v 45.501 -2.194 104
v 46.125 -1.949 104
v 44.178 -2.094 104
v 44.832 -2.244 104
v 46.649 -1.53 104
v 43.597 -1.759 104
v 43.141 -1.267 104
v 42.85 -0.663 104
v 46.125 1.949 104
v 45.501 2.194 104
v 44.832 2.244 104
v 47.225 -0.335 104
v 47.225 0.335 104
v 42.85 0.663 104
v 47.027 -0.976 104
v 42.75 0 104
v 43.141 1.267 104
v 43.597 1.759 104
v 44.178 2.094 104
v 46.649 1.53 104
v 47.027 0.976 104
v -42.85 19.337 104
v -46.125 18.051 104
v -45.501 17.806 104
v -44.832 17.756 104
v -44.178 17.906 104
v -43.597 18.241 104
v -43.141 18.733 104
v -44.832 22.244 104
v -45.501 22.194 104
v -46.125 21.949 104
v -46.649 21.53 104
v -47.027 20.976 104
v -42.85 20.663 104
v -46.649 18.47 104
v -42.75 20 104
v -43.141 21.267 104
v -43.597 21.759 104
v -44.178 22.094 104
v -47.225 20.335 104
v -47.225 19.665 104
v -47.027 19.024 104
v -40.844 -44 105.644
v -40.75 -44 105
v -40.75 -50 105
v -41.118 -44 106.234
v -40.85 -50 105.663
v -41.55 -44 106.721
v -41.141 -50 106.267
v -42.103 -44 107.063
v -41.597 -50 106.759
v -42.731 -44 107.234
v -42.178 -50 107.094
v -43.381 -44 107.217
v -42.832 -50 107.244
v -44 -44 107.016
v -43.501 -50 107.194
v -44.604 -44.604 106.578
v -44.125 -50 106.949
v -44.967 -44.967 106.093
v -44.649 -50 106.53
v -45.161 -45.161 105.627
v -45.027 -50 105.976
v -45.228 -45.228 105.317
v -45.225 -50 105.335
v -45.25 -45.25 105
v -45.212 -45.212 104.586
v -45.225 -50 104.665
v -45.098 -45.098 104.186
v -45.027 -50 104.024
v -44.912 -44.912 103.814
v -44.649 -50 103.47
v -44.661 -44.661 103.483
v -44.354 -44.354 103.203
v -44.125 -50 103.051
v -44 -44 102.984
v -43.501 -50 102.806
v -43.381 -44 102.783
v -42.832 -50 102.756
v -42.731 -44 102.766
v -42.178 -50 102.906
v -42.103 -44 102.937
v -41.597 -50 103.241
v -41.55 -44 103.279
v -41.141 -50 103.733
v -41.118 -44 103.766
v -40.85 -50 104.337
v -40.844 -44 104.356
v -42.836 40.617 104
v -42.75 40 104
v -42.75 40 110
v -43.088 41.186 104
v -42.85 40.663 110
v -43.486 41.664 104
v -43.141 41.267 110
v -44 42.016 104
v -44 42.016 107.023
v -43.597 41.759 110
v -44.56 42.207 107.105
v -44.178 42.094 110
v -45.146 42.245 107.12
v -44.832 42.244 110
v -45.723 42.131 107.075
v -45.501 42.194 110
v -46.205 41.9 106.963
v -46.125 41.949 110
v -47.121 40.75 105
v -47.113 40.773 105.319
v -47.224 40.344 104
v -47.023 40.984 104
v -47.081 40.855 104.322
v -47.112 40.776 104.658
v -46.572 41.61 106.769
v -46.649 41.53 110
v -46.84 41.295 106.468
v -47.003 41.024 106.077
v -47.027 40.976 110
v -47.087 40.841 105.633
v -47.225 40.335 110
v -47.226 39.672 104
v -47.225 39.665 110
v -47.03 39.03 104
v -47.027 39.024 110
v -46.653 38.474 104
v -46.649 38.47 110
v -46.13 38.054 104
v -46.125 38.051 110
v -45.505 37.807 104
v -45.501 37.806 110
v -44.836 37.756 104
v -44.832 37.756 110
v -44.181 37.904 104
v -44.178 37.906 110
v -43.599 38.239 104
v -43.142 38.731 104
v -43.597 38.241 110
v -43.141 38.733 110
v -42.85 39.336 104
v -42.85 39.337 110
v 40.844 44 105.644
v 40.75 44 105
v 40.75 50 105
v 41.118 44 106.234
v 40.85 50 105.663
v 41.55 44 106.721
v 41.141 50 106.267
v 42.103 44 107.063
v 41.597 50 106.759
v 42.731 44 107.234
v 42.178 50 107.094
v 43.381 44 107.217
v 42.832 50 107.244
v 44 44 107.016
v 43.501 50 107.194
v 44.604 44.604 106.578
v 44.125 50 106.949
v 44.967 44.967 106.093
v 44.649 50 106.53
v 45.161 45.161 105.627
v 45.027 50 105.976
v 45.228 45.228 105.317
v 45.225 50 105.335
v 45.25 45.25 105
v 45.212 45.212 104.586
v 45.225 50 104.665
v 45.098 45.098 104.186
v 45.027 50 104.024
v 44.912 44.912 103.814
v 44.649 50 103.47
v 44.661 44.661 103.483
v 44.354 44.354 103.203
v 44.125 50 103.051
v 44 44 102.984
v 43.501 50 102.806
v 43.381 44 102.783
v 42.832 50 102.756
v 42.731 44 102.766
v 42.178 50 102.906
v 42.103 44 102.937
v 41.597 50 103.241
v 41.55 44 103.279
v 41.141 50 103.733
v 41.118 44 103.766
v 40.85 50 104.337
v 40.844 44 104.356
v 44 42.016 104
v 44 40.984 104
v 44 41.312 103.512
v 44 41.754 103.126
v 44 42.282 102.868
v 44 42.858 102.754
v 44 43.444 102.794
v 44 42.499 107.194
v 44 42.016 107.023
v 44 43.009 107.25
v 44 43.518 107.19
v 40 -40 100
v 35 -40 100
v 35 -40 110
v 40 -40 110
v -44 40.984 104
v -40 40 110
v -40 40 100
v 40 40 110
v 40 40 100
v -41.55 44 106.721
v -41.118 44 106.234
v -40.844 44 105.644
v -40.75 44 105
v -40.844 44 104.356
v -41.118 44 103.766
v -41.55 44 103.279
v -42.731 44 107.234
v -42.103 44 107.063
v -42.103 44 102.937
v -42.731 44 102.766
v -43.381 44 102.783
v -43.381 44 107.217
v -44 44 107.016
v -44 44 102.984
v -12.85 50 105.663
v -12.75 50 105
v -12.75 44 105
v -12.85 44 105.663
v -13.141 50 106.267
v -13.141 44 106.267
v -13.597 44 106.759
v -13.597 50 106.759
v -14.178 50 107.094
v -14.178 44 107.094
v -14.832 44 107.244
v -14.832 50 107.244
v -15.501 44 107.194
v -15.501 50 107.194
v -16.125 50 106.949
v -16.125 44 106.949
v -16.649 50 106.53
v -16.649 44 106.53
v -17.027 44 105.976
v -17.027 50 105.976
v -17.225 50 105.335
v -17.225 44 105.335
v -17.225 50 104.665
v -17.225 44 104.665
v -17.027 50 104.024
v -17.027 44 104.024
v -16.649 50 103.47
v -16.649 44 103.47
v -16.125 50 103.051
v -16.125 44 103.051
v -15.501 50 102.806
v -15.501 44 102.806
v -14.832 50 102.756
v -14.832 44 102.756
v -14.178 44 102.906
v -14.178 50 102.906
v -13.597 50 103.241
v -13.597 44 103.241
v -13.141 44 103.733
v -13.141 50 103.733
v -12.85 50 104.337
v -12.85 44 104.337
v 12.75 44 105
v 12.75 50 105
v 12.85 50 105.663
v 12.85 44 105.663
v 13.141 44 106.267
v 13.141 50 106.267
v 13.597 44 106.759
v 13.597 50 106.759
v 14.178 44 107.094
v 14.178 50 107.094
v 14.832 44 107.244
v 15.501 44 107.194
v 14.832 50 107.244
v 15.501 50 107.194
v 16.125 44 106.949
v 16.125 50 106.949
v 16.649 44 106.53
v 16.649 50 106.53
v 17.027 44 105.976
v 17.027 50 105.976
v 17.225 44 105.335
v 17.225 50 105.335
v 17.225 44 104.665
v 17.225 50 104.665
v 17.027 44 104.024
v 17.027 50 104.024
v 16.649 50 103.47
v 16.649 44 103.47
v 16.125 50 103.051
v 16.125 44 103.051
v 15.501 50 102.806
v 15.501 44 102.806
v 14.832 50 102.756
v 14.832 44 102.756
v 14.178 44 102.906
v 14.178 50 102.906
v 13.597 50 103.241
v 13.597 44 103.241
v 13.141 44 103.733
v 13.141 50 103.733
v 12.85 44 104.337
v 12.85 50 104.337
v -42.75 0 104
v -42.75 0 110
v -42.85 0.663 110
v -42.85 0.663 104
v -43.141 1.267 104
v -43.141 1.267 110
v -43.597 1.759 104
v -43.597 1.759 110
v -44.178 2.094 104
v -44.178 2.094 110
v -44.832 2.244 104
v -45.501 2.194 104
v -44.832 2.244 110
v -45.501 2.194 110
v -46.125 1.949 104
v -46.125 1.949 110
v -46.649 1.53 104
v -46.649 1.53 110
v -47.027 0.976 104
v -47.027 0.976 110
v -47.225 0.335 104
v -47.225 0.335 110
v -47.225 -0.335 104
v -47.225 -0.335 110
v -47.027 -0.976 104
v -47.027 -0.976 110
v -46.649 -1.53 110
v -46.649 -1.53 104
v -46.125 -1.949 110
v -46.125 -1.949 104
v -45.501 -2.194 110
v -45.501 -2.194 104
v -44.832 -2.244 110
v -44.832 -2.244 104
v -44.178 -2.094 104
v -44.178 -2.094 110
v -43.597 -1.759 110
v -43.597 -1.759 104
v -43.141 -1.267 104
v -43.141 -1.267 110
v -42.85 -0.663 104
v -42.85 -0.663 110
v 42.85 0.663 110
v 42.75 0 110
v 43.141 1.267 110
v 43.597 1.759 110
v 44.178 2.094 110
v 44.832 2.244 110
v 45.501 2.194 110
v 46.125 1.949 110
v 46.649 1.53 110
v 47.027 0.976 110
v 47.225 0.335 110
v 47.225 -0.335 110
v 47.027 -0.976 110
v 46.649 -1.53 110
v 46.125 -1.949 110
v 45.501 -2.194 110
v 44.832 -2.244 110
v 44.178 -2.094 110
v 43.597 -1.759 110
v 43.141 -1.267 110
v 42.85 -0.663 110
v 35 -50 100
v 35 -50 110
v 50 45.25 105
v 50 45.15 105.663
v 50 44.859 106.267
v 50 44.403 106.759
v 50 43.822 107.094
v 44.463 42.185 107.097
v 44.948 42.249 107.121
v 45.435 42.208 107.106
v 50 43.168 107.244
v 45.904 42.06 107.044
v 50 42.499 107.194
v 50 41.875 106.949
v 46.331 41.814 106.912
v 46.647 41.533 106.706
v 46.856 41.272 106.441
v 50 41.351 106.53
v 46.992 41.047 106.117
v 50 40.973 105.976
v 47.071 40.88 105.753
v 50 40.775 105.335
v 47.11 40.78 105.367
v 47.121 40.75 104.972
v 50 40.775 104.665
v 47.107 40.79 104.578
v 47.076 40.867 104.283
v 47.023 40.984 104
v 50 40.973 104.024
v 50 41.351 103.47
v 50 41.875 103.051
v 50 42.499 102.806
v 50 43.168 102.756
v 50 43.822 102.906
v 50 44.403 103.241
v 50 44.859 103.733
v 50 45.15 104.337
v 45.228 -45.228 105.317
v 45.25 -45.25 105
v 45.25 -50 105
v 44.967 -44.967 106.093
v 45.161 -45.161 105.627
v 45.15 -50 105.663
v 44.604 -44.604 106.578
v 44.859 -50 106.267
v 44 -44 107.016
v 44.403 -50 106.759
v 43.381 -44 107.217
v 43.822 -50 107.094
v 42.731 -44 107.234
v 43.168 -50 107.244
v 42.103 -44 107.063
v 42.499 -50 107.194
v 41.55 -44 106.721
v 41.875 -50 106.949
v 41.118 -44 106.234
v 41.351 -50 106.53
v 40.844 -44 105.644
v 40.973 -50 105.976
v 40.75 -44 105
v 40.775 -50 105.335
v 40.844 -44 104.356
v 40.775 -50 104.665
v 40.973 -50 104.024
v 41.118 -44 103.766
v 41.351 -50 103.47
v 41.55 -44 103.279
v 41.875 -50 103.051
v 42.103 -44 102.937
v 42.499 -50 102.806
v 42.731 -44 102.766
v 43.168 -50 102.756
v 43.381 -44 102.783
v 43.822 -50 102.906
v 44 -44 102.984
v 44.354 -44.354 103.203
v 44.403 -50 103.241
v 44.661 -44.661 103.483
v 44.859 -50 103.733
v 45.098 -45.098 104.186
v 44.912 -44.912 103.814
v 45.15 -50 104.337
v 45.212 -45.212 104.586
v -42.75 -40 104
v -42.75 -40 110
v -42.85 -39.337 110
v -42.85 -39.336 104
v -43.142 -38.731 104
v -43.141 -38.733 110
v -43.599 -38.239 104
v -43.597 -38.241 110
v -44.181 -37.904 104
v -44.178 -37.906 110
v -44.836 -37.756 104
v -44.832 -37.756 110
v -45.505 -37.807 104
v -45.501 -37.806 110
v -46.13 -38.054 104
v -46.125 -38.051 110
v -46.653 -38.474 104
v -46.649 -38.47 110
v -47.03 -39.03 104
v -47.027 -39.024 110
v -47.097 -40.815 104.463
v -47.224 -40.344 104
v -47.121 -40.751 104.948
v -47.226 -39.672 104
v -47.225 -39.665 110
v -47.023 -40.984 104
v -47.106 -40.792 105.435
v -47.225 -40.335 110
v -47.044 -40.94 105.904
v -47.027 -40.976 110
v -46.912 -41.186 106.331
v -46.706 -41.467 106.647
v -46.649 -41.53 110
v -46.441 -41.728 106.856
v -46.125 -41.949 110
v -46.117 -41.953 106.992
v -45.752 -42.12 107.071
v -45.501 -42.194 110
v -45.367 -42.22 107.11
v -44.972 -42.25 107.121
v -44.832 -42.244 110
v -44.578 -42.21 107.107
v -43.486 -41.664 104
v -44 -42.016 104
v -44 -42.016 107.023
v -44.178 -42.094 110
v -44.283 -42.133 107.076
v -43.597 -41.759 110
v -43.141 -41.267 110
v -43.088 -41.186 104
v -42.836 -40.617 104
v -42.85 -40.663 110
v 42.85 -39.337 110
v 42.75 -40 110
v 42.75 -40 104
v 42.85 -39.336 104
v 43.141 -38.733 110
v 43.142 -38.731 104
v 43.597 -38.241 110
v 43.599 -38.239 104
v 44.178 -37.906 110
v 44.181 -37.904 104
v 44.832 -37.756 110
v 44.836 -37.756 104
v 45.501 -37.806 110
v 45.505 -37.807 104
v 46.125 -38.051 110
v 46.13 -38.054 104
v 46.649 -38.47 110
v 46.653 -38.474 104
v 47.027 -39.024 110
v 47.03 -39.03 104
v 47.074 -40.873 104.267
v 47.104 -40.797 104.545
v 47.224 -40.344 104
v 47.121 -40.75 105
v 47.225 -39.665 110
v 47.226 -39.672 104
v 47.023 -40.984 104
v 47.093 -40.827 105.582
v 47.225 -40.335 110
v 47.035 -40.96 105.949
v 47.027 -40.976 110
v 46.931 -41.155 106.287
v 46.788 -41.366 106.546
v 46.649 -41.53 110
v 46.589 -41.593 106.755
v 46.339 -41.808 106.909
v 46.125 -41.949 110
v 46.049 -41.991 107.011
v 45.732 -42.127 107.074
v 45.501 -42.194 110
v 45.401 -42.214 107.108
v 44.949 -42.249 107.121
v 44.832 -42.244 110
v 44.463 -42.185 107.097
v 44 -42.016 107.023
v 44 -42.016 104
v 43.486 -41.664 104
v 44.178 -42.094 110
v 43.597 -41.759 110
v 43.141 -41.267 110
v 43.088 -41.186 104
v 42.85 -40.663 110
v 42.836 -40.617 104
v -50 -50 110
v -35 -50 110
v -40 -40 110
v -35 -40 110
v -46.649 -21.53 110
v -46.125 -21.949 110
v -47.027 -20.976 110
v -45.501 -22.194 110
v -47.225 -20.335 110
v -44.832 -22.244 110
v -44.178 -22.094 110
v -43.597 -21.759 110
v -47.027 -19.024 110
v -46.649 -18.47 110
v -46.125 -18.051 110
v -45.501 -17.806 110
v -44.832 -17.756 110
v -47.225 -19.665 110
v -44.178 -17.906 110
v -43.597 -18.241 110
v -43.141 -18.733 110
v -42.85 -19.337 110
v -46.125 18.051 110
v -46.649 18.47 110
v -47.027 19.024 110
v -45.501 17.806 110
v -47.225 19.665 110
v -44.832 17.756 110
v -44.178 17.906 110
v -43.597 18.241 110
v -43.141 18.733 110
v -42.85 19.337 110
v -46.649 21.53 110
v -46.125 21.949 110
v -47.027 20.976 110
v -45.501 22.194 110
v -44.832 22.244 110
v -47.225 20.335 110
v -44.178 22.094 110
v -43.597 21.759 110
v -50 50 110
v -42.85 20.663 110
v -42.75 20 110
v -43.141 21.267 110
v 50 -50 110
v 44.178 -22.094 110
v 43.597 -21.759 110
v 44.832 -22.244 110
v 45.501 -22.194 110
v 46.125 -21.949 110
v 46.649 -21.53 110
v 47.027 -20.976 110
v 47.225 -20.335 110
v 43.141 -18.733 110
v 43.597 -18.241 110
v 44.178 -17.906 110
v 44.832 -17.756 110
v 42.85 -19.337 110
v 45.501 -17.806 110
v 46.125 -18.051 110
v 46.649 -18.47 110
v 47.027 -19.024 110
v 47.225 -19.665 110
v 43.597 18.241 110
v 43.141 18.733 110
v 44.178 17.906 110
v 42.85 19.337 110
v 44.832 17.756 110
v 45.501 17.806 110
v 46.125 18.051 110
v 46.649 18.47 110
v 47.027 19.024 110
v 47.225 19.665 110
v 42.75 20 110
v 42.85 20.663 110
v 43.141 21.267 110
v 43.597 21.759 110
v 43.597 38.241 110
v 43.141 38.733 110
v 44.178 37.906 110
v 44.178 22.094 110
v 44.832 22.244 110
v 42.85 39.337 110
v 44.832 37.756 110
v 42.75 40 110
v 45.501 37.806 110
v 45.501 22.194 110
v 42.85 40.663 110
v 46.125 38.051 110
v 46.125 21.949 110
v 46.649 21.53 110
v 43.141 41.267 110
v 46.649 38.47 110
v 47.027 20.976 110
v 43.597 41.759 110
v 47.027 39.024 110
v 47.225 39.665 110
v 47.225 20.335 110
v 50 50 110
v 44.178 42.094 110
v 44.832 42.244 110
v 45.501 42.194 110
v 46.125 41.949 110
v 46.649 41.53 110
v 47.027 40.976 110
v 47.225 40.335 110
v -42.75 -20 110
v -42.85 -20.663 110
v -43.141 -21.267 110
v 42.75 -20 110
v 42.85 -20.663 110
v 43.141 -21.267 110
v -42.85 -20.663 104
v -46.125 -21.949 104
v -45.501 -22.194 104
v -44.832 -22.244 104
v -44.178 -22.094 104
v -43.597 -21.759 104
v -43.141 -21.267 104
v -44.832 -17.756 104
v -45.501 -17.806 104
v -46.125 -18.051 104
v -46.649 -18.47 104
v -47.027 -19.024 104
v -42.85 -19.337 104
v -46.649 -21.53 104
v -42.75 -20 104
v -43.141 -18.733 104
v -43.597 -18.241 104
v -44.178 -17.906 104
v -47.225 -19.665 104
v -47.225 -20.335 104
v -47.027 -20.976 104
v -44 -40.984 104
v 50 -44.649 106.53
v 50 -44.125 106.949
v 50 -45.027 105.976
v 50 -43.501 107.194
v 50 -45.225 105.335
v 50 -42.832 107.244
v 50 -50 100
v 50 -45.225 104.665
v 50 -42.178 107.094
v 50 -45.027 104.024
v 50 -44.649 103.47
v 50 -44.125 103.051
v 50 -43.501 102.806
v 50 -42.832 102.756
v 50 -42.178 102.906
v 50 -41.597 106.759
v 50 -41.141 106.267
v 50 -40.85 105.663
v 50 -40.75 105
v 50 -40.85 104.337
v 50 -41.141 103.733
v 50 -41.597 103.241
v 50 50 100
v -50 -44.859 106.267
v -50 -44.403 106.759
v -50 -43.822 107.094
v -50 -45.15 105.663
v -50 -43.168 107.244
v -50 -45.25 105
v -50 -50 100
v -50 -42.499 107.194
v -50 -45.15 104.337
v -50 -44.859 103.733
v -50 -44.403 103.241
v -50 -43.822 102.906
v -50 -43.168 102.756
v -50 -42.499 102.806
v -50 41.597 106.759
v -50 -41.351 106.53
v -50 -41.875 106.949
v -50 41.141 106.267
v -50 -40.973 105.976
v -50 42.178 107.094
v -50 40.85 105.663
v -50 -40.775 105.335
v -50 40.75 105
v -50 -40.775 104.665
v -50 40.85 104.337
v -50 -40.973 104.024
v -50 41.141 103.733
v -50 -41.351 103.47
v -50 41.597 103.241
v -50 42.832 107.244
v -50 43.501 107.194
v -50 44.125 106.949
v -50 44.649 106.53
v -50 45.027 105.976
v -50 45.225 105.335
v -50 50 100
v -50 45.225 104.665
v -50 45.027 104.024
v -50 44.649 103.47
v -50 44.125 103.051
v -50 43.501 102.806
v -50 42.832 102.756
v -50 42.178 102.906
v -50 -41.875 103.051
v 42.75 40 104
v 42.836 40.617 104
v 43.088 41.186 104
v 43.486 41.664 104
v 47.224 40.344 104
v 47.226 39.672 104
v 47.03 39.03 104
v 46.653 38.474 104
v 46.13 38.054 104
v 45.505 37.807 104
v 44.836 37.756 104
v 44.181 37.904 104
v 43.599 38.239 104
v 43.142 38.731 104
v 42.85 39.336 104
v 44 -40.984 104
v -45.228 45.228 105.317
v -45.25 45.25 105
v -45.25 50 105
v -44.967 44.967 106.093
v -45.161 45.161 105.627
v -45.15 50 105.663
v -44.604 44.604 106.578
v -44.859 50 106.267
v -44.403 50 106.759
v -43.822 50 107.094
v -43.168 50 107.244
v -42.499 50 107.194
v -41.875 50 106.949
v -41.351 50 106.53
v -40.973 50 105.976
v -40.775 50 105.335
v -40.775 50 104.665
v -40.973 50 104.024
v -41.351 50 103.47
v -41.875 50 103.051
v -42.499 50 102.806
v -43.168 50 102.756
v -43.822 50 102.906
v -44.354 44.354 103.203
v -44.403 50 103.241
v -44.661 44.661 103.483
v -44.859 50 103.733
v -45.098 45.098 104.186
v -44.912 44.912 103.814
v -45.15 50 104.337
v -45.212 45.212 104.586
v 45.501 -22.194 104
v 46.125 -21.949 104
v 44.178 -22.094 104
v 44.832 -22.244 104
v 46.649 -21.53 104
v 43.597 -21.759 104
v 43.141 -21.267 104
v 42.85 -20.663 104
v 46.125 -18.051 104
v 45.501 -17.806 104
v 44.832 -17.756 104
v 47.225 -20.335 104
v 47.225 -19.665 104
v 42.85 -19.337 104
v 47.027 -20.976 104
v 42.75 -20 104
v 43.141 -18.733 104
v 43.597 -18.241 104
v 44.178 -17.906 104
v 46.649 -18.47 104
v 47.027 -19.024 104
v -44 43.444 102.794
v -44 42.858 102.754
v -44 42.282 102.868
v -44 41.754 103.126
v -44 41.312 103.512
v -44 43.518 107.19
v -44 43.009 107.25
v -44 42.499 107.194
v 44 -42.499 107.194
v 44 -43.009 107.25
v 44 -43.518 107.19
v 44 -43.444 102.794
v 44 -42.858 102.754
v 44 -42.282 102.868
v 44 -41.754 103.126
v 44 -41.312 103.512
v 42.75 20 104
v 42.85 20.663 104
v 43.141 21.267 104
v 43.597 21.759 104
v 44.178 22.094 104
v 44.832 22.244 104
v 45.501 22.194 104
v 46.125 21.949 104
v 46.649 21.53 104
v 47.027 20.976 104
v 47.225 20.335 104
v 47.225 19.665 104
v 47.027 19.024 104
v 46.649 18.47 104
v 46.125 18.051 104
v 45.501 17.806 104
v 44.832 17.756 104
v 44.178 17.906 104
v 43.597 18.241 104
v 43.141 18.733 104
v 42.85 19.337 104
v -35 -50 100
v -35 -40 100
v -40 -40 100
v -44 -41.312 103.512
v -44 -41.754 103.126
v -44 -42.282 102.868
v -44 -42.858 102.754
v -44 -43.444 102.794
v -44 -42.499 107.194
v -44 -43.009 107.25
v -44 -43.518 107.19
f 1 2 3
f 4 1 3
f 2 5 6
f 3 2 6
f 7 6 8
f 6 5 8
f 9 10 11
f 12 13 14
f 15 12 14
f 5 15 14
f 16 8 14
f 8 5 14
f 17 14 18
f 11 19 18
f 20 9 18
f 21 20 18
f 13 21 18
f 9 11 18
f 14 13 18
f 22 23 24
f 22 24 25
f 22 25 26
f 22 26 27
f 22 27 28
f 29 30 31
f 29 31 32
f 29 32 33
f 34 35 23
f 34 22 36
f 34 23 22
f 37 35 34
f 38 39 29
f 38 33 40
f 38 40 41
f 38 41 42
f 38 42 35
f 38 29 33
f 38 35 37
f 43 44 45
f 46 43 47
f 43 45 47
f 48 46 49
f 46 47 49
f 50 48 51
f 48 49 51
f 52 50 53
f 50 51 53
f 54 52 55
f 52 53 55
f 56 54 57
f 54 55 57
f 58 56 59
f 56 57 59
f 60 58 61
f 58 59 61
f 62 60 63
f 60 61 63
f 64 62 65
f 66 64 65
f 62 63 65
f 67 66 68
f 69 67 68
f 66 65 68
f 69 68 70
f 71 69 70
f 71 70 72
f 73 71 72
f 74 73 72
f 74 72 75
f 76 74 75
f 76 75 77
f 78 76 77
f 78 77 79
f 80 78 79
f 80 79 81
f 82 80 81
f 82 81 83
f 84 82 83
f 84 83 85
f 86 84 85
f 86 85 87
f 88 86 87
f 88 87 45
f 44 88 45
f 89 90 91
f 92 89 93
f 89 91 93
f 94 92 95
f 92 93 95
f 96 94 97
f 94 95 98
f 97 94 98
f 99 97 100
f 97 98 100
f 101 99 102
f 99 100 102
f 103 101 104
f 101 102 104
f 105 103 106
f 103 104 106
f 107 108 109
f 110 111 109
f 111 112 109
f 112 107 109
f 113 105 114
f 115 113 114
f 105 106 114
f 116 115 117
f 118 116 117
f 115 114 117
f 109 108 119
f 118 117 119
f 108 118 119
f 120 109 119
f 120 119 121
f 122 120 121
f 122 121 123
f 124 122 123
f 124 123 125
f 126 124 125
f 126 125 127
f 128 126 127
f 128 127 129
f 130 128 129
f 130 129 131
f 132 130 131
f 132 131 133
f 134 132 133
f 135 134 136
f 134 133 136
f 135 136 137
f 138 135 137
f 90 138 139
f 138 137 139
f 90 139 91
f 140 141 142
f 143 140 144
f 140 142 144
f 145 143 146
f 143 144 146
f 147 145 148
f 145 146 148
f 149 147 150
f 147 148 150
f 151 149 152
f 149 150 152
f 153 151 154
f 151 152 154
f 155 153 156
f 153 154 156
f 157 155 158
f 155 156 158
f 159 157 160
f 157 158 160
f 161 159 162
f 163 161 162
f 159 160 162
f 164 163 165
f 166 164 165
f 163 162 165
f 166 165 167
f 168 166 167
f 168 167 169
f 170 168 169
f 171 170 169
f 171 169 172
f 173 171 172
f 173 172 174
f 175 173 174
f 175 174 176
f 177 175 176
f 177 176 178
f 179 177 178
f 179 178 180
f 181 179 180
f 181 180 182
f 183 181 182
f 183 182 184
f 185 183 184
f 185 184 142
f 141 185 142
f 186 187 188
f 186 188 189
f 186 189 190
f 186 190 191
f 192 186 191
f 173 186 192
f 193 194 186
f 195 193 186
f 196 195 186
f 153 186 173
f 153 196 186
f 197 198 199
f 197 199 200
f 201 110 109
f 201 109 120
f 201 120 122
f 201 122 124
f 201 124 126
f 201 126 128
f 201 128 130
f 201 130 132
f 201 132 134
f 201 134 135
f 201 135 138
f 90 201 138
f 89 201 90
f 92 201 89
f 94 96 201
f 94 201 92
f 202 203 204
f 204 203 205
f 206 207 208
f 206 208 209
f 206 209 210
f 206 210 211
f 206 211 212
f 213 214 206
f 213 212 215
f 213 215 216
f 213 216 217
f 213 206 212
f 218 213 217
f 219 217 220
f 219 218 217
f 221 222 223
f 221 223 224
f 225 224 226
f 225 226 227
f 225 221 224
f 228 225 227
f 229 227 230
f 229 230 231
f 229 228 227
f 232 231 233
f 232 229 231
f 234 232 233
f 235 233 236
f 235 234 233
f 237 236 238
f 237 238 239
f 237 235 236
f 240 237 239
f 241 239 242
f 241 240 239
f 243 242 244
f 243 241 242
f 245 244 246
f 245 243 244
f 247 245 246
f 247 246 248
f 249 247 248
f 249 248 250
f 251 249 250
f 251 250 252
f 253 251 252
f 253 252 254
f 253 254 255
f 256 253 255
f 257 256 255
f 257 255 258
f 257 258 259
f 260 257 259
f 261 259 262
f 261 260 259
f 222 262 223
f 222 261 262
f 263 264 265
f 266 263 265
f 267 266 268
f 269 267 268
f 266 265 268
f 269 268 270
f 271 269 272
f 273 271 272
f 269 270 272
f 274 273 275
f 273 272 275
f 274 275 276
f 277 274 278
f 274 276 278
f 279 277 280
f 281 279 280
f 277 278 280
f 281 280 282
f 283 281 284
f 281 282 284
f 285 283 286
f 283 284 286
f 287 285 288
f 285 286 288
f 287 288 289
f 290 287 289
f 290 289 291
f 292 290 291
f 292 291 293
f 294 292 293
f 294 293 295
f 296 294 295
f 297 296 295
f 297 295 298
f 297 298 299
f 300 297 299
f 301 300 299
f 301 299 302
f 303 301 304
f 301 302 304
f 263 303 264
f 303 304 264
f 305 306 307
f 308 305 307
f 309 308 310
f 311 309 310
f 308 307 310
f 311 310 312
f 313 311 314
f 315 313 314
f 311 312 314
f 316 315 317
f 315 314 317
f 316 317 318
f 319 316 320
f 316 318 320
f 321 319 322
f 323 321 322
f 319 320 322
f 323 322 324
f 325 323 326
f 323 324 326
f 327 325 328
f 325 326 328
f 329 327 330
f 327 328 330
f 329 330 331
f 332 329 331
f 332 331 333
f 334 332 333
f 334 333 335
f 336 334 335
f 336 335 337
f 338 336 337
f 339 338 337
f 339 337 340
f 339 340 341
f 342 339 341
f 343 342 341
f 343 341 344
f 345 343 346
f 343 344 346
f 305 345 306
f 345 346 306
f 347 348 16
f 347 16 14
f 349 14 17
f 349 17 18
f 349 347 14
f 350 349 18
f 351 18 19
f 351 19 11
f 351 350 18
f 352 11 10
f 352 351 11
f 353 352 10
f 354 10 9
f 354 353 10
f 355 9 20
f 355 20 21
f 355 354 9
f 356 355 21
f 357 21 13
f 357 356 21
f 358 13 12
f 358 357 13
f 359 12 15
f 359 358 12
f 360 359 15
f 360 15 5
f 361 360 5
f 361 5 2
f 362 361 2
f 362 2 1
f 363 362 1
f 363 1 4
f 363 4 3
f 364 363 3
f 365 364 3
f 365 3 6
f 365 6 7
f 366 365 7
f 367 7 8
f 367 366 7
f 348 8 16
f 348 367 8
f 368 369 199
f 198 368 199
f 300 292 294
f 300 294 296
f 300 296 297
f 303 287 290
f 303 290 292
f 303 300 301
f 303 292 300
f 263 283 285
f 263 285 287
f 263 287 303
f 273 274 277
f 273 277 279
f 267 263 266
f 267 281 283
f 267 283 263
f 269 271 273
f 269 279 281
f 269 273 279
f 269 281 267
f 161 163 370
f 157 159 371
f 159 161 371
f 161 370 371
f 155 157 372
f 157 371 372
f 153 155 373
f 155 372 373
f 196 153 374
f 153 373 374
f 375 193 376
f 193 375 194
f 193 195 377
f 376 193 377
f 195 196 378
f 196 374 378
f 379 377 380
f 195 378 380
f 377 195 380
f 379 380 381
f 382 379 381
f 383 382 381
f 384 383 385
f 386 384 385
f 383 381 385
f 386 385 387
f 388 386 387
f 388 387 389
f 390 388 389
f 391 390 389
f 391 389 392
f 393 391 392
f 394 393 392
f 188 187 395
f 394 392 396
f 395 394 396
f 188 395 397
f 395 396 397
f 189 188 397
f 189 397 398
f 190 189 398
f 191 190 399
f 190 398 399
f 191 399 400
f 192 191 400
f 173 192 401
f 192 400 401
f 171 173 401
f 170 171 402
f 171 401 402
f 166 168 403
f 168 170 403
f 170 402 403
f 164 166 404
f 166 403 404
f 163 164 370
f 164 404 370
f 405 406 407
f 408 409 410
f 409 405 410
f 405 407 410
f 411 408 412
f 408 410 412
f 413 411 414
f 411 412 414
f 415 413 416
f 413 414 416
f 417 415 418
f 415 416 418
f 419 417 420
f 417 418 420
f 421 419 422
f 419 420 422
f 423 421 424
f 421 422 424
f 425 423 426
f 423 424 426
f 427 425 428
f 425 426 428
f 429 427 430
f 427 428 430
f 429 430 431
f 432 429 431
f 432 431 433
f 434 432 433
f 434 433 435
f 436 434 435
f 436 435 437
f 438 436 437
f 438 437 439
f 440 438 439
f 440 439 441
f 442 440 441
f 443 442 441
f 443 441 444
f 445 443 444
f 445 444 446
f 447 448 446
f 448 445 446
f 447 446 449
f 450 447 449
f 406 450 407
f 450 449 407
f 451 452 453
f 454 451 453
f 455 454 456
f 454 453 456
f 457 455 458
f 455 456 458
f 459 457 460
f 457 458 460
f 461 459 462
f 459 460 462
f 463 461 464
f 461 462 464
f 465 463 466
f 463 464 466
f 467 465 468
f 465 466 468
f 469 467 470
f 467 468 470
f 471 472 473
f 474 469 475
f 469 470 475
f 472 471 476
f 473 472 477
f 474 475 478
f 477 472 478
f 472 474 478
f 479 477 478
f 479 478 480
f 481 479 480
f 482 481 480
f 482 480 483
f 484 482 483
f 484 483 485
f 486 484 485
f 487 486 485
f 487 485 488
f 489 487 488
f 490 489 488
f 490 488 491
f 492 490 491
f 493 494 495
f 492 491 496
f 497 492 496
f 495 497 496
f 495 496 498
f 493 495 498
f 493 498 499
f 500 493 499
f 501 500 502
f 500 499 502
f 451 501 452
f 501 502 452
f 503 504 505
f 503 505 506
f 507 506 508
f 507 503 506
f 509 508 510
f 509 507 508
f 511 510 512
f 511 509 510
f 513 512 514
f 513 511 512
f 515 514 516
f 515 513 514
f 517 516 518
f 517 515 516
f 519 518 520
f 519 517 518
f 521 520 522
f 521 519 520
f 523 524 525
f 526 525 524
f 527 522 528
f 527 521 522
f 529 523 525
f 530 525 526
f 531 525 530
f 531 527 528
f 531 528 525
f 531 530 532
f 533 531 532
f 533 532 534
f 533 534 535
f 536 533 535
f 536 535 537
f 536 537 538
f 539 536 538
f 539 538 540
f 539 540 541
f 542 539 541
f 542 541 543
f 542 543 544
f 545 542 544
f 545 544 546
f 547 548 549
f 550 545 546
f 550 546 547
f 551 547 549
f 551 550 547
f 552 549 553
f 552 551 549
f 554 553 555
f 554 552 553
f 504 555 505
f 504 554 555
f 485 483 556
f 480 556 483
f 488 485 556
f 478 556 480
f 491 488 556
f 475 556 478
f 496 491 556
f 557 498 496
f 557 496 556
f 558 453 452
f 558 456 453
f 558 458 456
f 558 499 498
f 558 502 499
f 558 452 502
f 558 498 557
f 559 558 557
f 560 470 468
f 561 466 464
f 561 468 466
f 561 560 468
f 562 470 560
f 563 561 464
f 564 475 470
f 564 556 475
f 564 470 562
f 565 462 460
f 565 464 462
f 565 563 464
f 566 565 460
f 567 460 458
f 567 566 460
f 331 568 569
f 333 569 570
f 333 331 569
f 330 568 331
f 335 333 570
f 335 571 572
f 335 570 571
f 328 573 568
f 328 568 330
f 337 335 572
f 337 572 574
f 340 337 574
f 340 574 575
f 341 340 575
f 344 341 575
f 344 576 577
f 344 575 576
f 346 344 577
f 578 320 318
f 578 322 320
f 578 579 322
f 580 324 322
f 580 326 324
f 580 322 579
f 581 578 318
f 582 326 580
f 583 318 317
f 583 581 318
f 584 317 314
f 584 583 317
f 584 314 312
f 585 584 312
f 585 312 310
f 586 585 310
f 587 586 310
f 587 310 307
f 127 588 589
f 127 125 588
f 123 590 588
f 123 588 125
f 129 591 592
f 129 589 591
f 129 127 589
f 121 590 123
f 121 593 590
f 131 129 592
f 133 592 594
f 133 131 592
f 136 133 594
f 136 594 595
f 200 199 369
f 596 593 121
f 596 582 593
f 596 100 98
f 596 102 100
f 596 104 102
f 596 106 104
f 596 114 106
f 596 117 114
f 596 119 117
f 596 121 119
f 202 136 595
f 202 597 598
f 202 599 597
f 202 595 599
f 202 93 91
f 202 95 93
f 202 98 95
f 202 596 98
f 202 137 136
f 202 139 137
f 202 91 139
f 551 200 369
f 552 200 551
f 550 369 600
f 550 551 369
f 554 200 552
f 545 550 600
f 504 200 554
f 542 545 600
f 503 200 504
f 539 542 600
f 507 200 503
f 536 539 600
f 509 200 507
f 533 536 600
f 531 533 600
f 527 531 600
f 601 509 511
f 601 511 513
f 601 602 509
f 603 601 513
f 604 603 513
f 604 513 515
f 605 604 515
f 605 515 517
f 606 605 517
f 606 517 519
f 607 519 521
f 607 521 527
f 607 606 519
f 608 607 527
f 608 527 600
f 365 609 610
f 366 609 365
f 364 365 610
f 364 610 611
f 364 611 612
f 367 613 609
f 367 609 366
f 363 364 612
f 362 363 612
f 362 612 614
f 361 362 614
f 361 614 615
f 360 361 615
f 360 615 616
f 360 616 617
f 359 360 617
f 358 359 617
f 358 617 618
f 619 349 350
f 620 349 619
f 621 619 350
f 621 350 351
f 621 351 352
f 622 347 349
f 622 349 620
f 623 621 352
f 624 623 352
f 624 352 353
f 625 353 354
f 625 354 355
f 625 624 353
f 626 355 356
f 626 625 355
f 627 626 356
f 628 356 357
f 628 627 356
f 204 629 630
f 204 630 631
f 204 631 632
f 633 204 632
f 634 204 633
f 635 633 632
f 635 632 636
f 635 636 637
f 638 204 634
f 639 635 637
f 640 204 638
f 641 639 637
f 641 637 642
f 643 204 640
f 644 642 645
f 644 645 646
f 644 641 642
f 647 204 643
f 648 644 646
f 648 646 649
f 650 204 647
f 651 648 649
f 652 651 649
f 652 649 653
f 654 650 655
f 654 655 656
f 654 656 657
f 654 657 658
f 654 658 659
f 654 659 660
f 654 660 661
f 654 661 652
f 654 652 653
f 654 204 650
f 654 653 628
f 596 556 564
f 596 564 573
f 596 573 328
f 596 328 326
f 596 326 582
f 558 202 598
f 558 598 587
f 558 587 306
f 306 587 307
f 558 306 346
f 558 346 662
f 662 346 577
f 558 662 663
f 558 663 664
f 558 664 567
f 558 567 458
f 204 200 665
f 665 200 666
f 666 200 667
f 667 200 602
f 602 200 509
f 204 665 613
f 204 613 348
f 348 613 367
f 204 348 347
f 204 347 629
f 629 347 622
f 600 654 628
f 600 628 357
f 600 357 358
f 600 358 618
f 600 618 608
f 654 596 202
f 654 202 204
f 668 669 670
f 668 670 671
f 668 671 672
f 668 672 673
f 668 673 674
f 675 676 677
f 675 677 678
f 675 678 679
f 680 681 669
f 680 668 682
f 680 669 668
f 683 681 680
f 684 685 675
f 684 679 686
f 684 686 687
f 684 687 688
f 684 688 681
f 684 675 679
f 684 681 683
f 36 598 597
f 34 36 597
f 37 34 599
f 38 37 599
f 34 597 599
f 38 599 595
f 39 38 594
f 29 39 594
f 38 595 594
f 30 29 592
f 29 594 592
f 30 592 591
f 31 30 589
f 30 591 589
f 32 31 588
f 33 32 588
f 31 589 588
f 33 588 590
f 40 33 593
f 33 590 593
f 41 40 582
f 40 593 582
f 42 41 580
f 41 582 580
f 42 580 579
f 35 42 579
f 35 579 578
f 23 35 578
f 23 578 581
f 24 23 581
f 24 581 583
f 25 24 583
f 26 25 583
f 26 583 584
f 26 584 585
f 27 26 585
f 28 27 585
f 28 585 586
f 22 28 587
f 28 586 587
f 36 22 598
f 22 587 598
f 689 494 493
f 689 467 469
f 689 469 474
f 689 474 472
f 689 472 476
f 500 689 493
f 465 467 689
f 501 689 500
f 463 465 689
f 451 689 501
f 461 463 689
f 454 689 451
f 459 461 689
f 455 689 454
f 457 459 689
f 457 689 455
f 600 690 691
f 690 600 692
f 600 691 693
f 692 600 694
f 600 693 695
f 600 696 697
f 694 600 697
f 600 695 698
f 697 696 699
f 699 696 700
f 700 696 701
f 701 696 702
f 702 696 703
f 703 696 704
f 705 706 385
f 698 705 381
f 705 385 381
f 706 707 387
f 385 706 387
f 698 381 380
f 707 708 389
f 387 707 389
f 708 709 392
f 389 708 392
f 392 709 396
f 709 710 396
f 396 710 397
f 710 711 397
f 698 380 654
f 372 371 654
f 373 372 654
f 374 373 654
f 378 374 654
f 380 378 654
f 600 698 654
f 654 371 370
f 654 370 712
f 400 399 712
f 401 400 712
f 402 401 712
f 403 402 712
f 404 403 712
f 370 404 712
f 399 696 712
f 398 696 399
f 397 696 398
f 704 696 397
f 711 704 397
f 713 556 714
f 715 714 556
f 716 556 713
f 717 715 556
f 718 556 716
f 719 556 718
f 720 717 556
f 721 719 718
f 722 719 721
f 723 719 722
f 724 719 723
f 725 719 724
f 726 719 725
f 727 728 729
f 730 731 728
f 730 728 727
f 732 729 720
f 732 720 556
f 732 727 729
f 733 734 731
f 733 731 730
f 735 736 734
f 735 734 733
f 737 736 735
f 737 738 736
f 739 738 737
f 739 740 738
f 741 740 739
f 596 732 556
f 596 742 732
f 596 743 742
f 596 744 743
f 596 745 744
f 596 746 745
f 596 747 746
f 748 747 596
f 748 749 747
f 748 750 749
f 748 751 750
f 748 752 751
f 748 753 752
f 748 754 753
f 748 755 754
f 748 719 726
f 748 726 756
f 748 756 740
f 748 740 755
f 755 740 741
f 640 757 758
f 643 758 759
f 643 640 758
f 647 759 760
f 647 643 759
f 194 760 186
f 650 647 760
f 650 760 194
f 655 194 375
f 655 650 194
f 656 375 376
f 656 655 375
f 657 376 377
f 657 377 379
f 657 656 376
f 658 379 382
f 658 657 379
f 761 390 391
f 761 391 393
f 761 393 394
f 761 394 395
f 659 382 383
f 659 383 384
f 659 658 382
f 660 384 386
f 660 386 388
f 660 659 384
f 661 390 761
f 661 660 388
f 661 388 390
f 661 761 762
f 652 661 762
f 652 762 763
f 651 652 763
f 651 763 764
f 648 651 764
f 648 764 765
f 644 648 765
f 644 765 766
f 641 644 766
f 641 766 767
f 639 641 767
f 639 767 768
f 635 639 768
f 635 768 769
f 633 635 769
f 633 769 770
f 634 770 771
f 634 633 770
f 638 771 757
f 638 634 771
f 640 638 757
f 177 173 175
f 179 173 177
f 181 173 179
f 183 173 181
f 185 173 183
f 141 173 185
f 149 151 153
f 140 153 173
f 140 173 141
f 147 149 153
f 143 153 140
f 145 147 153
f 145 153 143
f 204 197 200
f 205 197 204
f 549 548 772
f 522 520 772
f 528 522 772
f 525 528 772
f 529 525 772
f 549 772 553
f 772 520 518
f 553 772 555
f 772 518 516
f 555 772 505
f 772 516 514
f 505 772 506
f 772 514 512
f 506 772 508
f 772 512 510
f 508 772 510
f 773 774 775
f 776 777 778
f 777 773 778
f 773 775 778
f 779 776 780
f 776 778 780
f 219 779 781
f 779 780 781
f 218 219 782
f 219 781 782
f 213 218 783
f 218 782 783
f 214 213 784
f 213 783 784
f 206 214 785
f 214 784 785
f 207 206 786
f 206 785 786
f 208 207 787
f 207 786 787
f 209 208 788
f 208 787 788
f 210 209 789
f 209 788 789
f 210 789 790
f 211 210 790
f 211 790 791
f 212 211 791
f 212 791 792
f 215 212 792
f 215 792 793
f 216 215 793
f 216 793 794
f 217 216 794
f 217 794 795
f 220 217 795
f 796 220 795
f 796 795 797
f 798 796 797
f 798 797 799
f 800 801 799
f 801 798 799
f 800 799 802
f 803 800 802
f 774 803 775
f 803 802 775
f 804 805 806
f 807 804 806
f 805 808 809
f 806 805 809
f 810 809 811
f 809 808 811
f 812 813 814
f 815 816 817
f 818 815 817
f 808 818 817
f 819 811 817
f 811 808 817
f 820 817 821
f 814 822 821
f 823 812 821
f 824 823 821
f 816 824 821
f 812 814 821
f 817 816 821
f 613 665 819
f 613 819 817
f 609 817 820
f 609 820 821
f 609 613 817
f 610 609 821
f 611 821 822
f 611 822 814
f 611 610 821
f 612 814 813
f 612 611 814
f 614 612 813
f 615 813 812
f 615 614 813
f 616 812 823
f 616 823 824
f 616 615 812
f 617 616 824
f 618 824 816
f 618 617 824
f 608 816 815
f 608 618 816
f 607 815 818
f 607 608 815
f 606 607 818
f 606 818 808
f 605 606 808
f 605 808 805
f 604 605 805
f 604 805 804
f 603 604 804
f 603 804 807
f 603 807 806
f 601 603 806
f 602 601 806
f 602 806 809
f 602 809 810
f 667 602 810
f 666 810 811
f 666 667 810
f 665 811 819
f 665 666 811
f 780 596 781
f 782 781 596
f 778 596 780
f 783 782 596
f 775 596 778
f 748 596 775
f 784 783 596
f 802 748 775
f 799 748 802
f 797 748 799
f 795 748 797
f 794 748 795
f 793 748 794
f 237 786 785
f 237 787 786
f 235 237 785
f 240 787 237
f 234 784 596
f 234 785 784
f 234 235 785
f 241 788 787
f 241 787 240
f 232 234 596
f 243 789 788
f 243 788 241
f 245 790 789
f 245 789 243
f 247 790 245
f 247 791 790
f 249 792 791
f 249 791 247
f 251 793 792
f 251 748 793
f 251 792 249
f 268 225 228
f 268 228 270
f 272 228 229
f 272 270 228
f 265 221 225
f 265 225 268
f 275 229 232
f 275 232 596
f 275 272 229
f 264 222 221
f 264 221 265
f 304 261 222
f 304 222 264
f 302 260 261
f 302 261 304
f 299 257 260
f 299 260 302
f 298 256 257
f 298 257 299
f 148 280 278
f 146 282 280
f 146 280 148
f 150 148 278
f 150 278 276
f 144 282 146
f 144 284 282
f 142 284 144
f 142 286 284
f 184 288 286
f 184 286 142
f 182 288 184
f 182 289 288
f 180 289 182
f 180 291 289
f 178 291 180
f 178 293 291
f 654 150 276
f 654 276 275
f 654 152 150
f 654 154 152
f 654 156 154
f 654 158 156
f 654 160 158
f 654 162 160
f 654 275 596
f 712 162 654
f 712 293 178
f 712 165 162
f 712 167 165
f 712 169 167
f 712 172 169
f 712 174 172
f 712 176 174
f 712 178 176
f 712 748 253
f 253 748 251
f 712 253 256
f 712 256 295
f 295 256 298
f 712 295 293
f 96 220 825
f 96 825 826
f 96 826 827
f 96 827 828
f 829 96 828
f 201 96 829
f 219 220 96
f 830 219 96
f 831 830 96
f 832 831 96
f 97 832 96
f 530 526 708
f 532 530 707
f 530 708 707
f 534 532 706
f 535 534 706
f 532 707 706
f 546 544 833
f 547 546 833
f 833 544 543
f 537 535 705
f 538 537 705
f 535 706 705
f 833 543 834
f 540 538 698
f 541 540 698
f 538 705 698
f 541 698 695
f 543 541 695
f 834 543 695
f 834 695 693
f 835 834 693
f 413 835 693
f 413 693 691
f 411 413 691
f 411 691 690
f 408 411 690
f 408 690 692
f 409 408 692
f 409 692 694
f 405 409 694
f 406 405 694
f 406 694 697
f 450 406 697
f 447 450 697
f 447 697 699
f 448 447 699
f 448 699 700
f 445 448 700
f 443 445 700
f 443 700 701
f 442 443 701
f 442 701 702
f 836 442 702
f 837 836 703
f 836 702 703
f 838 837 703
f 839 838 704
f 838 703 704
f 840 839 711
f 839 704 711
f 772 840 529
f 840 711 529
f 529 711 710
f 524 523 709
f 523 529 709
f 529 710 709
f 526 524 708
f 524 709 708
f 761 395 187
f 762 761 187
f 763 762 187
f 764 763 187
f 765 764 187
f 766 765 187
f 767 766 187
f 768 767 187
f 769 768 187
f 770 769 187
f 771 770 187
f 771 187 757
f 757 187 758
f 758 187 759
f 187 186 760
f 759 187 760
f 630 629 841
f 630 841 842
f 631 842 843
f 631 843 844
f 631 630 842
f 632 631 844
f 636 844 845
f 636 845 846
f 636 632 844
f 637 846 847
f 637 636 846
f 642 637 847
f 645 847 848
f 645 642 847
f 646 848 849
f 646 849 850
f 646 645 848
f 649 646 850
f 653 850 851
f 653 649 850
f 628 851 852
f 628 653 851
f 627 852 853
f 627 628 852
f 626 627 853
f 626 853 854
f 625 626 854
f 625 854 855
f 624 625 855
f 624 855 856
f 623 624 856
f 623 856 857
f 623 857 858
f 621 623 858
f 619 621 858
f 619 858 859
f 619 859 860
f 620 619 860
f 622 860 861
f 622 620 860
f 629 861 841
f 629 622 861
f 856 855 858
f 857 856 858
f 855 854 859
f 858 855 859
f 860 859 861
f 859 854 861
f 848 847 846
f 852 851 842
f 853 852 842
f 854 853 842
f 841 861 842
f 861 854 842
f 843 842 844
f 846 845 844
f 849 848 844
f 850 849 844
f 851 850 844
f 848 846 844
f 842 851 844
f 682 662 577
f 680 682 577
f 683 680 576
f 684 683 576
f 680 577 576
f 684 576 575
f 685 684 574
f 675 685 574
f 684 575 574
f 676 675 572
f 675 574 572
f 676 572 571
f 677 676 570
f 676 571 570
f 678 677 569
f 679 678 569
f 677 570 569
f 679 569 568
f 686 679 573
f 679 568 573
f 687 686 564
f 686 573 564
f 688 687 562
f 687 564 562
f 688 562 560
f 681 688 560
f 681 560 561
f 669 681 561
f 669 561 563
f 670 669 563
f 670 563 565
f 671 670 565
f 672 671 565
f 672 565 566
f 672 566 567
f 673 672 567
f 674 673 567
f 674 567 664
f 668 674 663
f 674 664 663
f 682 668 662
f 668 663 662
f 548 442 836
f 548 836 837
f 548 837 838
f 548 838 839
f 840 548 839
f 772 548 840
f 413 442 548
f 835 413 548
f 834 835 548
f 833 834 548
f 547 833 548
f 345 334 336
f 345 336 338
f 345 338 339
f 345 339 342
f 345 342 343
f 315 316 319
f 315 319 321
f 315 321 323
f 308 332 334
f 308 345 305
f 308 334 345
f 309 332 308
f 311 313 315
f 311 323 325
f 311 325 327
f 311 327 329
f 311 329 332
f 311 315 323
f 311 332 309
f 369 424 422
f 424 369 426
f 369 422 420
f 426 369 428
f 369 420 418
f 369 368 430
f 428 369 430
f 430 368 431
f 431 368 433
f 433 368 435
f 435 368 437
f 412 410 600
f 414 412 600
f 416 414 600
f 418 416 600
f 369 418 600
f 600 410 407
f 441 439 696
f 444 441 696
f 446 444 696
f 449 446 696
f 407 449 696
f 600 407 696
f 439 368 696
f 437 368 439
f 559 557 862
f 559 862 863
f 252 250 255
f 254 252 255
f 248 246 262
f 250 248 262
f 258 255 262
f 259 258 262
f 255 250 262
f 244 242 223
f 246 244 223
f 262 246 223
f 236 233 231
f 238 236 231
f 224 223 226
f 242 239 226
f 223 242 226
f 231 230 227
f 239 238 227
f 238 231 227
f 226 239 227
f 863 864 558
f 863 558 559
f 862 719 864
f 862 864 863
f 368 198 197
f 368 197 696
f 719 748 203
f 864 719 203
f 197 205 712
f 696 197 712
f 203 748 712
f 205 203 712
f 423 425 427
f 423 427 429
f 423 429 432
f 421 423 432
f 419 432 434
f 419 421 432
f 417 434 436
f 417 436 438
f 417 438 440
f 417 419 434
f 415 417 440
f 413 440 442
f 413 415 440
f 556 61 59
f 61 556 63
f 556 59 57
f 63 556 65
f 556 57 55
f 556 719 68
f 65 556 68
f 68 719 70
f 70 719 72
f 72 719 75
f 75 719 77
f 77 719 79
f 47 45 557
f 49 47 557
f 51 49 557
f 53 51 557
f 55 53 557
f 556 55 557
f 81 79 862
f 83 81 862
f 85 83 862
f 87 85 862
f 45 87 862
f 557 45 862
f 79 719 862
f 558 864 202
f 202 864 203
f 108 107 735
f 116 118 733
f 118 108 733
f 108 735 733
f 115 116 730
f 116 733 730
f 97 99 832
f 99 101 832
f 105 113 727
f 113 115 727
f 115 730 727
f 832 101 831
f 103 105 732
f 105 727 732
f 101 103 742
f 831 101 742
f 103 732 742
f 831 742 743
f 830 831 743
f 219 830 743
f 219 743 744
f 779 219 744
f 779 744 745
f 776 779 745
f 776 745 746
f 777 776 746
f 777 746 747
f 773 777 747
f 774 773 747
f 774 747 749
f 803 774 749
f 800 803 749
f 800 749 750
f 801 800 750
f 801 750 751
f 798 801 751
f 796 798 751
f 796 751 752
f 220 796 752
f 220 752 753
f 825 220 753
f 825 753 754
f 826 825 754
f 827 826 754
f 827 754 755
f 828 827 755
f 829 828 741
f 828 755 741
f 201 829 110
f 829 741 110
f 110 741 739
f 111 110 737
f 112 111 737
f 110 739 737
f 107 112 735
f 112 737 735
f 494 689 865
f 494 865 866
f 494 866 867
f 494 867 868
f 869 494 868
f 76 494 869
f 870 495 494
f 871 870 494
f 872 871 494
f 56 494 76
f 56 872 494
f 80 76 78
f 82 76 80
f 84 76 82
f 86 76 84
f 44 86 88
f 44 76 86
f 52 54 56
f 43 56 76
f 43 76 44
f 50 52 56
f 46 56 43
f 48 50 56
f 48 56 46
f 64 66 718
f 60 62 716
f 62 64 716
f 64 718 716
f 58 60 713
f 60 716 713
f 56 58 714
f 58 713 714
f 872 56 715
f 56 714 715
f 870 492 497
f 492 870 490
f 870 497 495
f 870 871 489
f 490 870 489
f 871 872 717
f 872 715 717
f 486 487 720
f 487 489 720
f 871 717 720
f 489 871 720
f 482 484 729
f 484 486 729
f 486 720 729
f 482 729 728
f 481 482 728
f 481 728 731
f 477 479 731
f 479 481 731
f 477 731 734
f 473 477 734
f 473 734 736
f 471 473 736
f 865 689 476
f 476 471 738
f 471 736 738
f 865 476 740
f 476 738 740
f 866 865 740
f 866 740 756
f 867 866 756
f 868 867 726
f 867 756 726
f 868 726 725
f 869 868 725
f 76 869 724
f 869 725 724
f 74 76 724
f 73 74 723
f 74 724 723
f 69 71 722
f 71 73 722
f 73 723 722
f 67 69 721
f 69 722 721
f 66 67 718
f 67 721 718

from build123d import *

# Parameters (mm, degrees)
SKETCH_W              = 100
SKETCH_H              = 100
SKETCH_W_2            = 80
SKETCH_H_2            = 80
PAD_DEPTH             = 10
SKETCH002_R           = 2.25
POCKET_DEPTH          = 6
SKETCH070_R           = 2.25
POCKET044_DEPTH       = 6
POLARPATTERN_COUNT    = 4
SKETCH071_R           = 2.25
POCKET045_DEPTH       = 6
POLARPATTERN001_COUNT = 4
SKETCH072_R           = 2.25
POCKET046_DEPTH       = 6
SKETCH097_W           = 70
SKETCH097_H           = 10
POCKET060_DEPTH       = 10


with BuildPart() as part:
    # Sketch → Pad (new body)
    with BuildSketch(Plane.XY):
        Rectangle(SKETCH_W, SKETCH_H)
        Rectangle(SKETCH_W_2, SKETCH_H_2, mode=Mode.SUBTRACT)
    extrude(amount=PAD_DEPTH)

    # Sketch002 (on Face10 of Pad) → Pocket (cut)
    with BuildSketch(Plane.XY.offset(10)):
        with Locations((-45, 40)):
            Circle(SKETCH002_R)
        with Locations((-45, 20)):
            Circle(SKETCH002_R)
        with Locations((-45, 0)):
            Circle(SKETCH002_R)
        with Locations((-45, -20)):
            Circle(SKETCH002_R)
        with Locations((-45, -40)):
            Circle(SKETCH002_R)
    pocket = extrude(amount=-POCKET_DEPTH, mode=Mode.SUBTRACT)

    # Mirrored: Pocket across Sketch002 V_Axis
    add(pocket.mirror(Plane(origin=(0, 0, 10), x_dir=(0, 0, 1), z_dir=(1, 0, 0))), mode=Mode.SUBTRACT)

    # Sketch070 (on Face6 of Mirrored) → Pocket044 (cut)
    with BuildSketch(Plane.XZ.offset(50)):
        with Locations((-43, 5)):
            Circle(SKETCH070_R)
    pocket044 = extrude(amount=-POCKET044_DEPTH, mode=Mode.SUBTRACT)

    # PolarPattern: Pocket044 ×4 about axis
    polarpattern_axis = Axis((0, 0, 0), (0, 0, 1))
    for i in range(1, POLARPATTERN_COUNT):
        add(pocket044.rotate(polarpattern_axis, i * 360 / POLARPATTERN_COUNT), mode=Mode.SUBTRACT)

    # Sketch071 (on Face2 of PolarPattern) → Pocket045 (cut)
    with BuildSketch(Plane(origin=(-50, 0, 0), x_dir=(0, -1, 0), z_dir=(-1, 0, 0))):
        with Locations((43, 5)):
            Circle(SKETCH071_R)
    pocket045 = extrude(amount=-POCKET045_DEPTH, mode=Mode.SUBTRACT)

    # PolarPattern001: Pocket045 ×4 about axis
    polarpattern001_axis = Axis((0, 0, 0), (0, 0, 1))
    for i in range(1, POLARPATTERN001_COUNT):
        add(pocket045.rotate(polarpattern001_axis, i * 360 / POLARPATTERN001_COUNT), mode=Mode.SUBTRACT)

    # Sketch072 (on Face1 of PolarPattern001) → Pocket046 (cut)
    with BuildSketch(Plane(origin=(0, 50, 0), x_dir=(-1, 0, 0), z_dir=(0, 1, 0))):
        with Locations((-15, 5)):
            Circle(SKETCH072_R)
    pocket046 = extrude(amount=-POCKET046_DEPTH, mode=Mode.SUBTRACT)

    # Mirrored001: Pocket046 across Sketch072 V_Axis
    add(pocket046.mirror(Plane(origin=(0, 50, 0), x_dir=(0, 1, 0), z_dir=(-1, 0, 0))), mode=Mode.SUBTRACT)

    # Sketch097 (on Face4 of Mirrored001) → Pocket060 (cut)
    with BuildSketch(Plane.XY.offset(10)):
        with Locations((0, -45)):
            Rectangle(SKETCH097_W, SKETCH097_H)
    extrude(amount=-POCKET060_DEPTH, mode=Mode.SUBTRACT)


with BuildPart() as part_1:
    # Body placement: moved
    add(part.part.moved(Location((0, 0, 100))))


solid = part_1.part
